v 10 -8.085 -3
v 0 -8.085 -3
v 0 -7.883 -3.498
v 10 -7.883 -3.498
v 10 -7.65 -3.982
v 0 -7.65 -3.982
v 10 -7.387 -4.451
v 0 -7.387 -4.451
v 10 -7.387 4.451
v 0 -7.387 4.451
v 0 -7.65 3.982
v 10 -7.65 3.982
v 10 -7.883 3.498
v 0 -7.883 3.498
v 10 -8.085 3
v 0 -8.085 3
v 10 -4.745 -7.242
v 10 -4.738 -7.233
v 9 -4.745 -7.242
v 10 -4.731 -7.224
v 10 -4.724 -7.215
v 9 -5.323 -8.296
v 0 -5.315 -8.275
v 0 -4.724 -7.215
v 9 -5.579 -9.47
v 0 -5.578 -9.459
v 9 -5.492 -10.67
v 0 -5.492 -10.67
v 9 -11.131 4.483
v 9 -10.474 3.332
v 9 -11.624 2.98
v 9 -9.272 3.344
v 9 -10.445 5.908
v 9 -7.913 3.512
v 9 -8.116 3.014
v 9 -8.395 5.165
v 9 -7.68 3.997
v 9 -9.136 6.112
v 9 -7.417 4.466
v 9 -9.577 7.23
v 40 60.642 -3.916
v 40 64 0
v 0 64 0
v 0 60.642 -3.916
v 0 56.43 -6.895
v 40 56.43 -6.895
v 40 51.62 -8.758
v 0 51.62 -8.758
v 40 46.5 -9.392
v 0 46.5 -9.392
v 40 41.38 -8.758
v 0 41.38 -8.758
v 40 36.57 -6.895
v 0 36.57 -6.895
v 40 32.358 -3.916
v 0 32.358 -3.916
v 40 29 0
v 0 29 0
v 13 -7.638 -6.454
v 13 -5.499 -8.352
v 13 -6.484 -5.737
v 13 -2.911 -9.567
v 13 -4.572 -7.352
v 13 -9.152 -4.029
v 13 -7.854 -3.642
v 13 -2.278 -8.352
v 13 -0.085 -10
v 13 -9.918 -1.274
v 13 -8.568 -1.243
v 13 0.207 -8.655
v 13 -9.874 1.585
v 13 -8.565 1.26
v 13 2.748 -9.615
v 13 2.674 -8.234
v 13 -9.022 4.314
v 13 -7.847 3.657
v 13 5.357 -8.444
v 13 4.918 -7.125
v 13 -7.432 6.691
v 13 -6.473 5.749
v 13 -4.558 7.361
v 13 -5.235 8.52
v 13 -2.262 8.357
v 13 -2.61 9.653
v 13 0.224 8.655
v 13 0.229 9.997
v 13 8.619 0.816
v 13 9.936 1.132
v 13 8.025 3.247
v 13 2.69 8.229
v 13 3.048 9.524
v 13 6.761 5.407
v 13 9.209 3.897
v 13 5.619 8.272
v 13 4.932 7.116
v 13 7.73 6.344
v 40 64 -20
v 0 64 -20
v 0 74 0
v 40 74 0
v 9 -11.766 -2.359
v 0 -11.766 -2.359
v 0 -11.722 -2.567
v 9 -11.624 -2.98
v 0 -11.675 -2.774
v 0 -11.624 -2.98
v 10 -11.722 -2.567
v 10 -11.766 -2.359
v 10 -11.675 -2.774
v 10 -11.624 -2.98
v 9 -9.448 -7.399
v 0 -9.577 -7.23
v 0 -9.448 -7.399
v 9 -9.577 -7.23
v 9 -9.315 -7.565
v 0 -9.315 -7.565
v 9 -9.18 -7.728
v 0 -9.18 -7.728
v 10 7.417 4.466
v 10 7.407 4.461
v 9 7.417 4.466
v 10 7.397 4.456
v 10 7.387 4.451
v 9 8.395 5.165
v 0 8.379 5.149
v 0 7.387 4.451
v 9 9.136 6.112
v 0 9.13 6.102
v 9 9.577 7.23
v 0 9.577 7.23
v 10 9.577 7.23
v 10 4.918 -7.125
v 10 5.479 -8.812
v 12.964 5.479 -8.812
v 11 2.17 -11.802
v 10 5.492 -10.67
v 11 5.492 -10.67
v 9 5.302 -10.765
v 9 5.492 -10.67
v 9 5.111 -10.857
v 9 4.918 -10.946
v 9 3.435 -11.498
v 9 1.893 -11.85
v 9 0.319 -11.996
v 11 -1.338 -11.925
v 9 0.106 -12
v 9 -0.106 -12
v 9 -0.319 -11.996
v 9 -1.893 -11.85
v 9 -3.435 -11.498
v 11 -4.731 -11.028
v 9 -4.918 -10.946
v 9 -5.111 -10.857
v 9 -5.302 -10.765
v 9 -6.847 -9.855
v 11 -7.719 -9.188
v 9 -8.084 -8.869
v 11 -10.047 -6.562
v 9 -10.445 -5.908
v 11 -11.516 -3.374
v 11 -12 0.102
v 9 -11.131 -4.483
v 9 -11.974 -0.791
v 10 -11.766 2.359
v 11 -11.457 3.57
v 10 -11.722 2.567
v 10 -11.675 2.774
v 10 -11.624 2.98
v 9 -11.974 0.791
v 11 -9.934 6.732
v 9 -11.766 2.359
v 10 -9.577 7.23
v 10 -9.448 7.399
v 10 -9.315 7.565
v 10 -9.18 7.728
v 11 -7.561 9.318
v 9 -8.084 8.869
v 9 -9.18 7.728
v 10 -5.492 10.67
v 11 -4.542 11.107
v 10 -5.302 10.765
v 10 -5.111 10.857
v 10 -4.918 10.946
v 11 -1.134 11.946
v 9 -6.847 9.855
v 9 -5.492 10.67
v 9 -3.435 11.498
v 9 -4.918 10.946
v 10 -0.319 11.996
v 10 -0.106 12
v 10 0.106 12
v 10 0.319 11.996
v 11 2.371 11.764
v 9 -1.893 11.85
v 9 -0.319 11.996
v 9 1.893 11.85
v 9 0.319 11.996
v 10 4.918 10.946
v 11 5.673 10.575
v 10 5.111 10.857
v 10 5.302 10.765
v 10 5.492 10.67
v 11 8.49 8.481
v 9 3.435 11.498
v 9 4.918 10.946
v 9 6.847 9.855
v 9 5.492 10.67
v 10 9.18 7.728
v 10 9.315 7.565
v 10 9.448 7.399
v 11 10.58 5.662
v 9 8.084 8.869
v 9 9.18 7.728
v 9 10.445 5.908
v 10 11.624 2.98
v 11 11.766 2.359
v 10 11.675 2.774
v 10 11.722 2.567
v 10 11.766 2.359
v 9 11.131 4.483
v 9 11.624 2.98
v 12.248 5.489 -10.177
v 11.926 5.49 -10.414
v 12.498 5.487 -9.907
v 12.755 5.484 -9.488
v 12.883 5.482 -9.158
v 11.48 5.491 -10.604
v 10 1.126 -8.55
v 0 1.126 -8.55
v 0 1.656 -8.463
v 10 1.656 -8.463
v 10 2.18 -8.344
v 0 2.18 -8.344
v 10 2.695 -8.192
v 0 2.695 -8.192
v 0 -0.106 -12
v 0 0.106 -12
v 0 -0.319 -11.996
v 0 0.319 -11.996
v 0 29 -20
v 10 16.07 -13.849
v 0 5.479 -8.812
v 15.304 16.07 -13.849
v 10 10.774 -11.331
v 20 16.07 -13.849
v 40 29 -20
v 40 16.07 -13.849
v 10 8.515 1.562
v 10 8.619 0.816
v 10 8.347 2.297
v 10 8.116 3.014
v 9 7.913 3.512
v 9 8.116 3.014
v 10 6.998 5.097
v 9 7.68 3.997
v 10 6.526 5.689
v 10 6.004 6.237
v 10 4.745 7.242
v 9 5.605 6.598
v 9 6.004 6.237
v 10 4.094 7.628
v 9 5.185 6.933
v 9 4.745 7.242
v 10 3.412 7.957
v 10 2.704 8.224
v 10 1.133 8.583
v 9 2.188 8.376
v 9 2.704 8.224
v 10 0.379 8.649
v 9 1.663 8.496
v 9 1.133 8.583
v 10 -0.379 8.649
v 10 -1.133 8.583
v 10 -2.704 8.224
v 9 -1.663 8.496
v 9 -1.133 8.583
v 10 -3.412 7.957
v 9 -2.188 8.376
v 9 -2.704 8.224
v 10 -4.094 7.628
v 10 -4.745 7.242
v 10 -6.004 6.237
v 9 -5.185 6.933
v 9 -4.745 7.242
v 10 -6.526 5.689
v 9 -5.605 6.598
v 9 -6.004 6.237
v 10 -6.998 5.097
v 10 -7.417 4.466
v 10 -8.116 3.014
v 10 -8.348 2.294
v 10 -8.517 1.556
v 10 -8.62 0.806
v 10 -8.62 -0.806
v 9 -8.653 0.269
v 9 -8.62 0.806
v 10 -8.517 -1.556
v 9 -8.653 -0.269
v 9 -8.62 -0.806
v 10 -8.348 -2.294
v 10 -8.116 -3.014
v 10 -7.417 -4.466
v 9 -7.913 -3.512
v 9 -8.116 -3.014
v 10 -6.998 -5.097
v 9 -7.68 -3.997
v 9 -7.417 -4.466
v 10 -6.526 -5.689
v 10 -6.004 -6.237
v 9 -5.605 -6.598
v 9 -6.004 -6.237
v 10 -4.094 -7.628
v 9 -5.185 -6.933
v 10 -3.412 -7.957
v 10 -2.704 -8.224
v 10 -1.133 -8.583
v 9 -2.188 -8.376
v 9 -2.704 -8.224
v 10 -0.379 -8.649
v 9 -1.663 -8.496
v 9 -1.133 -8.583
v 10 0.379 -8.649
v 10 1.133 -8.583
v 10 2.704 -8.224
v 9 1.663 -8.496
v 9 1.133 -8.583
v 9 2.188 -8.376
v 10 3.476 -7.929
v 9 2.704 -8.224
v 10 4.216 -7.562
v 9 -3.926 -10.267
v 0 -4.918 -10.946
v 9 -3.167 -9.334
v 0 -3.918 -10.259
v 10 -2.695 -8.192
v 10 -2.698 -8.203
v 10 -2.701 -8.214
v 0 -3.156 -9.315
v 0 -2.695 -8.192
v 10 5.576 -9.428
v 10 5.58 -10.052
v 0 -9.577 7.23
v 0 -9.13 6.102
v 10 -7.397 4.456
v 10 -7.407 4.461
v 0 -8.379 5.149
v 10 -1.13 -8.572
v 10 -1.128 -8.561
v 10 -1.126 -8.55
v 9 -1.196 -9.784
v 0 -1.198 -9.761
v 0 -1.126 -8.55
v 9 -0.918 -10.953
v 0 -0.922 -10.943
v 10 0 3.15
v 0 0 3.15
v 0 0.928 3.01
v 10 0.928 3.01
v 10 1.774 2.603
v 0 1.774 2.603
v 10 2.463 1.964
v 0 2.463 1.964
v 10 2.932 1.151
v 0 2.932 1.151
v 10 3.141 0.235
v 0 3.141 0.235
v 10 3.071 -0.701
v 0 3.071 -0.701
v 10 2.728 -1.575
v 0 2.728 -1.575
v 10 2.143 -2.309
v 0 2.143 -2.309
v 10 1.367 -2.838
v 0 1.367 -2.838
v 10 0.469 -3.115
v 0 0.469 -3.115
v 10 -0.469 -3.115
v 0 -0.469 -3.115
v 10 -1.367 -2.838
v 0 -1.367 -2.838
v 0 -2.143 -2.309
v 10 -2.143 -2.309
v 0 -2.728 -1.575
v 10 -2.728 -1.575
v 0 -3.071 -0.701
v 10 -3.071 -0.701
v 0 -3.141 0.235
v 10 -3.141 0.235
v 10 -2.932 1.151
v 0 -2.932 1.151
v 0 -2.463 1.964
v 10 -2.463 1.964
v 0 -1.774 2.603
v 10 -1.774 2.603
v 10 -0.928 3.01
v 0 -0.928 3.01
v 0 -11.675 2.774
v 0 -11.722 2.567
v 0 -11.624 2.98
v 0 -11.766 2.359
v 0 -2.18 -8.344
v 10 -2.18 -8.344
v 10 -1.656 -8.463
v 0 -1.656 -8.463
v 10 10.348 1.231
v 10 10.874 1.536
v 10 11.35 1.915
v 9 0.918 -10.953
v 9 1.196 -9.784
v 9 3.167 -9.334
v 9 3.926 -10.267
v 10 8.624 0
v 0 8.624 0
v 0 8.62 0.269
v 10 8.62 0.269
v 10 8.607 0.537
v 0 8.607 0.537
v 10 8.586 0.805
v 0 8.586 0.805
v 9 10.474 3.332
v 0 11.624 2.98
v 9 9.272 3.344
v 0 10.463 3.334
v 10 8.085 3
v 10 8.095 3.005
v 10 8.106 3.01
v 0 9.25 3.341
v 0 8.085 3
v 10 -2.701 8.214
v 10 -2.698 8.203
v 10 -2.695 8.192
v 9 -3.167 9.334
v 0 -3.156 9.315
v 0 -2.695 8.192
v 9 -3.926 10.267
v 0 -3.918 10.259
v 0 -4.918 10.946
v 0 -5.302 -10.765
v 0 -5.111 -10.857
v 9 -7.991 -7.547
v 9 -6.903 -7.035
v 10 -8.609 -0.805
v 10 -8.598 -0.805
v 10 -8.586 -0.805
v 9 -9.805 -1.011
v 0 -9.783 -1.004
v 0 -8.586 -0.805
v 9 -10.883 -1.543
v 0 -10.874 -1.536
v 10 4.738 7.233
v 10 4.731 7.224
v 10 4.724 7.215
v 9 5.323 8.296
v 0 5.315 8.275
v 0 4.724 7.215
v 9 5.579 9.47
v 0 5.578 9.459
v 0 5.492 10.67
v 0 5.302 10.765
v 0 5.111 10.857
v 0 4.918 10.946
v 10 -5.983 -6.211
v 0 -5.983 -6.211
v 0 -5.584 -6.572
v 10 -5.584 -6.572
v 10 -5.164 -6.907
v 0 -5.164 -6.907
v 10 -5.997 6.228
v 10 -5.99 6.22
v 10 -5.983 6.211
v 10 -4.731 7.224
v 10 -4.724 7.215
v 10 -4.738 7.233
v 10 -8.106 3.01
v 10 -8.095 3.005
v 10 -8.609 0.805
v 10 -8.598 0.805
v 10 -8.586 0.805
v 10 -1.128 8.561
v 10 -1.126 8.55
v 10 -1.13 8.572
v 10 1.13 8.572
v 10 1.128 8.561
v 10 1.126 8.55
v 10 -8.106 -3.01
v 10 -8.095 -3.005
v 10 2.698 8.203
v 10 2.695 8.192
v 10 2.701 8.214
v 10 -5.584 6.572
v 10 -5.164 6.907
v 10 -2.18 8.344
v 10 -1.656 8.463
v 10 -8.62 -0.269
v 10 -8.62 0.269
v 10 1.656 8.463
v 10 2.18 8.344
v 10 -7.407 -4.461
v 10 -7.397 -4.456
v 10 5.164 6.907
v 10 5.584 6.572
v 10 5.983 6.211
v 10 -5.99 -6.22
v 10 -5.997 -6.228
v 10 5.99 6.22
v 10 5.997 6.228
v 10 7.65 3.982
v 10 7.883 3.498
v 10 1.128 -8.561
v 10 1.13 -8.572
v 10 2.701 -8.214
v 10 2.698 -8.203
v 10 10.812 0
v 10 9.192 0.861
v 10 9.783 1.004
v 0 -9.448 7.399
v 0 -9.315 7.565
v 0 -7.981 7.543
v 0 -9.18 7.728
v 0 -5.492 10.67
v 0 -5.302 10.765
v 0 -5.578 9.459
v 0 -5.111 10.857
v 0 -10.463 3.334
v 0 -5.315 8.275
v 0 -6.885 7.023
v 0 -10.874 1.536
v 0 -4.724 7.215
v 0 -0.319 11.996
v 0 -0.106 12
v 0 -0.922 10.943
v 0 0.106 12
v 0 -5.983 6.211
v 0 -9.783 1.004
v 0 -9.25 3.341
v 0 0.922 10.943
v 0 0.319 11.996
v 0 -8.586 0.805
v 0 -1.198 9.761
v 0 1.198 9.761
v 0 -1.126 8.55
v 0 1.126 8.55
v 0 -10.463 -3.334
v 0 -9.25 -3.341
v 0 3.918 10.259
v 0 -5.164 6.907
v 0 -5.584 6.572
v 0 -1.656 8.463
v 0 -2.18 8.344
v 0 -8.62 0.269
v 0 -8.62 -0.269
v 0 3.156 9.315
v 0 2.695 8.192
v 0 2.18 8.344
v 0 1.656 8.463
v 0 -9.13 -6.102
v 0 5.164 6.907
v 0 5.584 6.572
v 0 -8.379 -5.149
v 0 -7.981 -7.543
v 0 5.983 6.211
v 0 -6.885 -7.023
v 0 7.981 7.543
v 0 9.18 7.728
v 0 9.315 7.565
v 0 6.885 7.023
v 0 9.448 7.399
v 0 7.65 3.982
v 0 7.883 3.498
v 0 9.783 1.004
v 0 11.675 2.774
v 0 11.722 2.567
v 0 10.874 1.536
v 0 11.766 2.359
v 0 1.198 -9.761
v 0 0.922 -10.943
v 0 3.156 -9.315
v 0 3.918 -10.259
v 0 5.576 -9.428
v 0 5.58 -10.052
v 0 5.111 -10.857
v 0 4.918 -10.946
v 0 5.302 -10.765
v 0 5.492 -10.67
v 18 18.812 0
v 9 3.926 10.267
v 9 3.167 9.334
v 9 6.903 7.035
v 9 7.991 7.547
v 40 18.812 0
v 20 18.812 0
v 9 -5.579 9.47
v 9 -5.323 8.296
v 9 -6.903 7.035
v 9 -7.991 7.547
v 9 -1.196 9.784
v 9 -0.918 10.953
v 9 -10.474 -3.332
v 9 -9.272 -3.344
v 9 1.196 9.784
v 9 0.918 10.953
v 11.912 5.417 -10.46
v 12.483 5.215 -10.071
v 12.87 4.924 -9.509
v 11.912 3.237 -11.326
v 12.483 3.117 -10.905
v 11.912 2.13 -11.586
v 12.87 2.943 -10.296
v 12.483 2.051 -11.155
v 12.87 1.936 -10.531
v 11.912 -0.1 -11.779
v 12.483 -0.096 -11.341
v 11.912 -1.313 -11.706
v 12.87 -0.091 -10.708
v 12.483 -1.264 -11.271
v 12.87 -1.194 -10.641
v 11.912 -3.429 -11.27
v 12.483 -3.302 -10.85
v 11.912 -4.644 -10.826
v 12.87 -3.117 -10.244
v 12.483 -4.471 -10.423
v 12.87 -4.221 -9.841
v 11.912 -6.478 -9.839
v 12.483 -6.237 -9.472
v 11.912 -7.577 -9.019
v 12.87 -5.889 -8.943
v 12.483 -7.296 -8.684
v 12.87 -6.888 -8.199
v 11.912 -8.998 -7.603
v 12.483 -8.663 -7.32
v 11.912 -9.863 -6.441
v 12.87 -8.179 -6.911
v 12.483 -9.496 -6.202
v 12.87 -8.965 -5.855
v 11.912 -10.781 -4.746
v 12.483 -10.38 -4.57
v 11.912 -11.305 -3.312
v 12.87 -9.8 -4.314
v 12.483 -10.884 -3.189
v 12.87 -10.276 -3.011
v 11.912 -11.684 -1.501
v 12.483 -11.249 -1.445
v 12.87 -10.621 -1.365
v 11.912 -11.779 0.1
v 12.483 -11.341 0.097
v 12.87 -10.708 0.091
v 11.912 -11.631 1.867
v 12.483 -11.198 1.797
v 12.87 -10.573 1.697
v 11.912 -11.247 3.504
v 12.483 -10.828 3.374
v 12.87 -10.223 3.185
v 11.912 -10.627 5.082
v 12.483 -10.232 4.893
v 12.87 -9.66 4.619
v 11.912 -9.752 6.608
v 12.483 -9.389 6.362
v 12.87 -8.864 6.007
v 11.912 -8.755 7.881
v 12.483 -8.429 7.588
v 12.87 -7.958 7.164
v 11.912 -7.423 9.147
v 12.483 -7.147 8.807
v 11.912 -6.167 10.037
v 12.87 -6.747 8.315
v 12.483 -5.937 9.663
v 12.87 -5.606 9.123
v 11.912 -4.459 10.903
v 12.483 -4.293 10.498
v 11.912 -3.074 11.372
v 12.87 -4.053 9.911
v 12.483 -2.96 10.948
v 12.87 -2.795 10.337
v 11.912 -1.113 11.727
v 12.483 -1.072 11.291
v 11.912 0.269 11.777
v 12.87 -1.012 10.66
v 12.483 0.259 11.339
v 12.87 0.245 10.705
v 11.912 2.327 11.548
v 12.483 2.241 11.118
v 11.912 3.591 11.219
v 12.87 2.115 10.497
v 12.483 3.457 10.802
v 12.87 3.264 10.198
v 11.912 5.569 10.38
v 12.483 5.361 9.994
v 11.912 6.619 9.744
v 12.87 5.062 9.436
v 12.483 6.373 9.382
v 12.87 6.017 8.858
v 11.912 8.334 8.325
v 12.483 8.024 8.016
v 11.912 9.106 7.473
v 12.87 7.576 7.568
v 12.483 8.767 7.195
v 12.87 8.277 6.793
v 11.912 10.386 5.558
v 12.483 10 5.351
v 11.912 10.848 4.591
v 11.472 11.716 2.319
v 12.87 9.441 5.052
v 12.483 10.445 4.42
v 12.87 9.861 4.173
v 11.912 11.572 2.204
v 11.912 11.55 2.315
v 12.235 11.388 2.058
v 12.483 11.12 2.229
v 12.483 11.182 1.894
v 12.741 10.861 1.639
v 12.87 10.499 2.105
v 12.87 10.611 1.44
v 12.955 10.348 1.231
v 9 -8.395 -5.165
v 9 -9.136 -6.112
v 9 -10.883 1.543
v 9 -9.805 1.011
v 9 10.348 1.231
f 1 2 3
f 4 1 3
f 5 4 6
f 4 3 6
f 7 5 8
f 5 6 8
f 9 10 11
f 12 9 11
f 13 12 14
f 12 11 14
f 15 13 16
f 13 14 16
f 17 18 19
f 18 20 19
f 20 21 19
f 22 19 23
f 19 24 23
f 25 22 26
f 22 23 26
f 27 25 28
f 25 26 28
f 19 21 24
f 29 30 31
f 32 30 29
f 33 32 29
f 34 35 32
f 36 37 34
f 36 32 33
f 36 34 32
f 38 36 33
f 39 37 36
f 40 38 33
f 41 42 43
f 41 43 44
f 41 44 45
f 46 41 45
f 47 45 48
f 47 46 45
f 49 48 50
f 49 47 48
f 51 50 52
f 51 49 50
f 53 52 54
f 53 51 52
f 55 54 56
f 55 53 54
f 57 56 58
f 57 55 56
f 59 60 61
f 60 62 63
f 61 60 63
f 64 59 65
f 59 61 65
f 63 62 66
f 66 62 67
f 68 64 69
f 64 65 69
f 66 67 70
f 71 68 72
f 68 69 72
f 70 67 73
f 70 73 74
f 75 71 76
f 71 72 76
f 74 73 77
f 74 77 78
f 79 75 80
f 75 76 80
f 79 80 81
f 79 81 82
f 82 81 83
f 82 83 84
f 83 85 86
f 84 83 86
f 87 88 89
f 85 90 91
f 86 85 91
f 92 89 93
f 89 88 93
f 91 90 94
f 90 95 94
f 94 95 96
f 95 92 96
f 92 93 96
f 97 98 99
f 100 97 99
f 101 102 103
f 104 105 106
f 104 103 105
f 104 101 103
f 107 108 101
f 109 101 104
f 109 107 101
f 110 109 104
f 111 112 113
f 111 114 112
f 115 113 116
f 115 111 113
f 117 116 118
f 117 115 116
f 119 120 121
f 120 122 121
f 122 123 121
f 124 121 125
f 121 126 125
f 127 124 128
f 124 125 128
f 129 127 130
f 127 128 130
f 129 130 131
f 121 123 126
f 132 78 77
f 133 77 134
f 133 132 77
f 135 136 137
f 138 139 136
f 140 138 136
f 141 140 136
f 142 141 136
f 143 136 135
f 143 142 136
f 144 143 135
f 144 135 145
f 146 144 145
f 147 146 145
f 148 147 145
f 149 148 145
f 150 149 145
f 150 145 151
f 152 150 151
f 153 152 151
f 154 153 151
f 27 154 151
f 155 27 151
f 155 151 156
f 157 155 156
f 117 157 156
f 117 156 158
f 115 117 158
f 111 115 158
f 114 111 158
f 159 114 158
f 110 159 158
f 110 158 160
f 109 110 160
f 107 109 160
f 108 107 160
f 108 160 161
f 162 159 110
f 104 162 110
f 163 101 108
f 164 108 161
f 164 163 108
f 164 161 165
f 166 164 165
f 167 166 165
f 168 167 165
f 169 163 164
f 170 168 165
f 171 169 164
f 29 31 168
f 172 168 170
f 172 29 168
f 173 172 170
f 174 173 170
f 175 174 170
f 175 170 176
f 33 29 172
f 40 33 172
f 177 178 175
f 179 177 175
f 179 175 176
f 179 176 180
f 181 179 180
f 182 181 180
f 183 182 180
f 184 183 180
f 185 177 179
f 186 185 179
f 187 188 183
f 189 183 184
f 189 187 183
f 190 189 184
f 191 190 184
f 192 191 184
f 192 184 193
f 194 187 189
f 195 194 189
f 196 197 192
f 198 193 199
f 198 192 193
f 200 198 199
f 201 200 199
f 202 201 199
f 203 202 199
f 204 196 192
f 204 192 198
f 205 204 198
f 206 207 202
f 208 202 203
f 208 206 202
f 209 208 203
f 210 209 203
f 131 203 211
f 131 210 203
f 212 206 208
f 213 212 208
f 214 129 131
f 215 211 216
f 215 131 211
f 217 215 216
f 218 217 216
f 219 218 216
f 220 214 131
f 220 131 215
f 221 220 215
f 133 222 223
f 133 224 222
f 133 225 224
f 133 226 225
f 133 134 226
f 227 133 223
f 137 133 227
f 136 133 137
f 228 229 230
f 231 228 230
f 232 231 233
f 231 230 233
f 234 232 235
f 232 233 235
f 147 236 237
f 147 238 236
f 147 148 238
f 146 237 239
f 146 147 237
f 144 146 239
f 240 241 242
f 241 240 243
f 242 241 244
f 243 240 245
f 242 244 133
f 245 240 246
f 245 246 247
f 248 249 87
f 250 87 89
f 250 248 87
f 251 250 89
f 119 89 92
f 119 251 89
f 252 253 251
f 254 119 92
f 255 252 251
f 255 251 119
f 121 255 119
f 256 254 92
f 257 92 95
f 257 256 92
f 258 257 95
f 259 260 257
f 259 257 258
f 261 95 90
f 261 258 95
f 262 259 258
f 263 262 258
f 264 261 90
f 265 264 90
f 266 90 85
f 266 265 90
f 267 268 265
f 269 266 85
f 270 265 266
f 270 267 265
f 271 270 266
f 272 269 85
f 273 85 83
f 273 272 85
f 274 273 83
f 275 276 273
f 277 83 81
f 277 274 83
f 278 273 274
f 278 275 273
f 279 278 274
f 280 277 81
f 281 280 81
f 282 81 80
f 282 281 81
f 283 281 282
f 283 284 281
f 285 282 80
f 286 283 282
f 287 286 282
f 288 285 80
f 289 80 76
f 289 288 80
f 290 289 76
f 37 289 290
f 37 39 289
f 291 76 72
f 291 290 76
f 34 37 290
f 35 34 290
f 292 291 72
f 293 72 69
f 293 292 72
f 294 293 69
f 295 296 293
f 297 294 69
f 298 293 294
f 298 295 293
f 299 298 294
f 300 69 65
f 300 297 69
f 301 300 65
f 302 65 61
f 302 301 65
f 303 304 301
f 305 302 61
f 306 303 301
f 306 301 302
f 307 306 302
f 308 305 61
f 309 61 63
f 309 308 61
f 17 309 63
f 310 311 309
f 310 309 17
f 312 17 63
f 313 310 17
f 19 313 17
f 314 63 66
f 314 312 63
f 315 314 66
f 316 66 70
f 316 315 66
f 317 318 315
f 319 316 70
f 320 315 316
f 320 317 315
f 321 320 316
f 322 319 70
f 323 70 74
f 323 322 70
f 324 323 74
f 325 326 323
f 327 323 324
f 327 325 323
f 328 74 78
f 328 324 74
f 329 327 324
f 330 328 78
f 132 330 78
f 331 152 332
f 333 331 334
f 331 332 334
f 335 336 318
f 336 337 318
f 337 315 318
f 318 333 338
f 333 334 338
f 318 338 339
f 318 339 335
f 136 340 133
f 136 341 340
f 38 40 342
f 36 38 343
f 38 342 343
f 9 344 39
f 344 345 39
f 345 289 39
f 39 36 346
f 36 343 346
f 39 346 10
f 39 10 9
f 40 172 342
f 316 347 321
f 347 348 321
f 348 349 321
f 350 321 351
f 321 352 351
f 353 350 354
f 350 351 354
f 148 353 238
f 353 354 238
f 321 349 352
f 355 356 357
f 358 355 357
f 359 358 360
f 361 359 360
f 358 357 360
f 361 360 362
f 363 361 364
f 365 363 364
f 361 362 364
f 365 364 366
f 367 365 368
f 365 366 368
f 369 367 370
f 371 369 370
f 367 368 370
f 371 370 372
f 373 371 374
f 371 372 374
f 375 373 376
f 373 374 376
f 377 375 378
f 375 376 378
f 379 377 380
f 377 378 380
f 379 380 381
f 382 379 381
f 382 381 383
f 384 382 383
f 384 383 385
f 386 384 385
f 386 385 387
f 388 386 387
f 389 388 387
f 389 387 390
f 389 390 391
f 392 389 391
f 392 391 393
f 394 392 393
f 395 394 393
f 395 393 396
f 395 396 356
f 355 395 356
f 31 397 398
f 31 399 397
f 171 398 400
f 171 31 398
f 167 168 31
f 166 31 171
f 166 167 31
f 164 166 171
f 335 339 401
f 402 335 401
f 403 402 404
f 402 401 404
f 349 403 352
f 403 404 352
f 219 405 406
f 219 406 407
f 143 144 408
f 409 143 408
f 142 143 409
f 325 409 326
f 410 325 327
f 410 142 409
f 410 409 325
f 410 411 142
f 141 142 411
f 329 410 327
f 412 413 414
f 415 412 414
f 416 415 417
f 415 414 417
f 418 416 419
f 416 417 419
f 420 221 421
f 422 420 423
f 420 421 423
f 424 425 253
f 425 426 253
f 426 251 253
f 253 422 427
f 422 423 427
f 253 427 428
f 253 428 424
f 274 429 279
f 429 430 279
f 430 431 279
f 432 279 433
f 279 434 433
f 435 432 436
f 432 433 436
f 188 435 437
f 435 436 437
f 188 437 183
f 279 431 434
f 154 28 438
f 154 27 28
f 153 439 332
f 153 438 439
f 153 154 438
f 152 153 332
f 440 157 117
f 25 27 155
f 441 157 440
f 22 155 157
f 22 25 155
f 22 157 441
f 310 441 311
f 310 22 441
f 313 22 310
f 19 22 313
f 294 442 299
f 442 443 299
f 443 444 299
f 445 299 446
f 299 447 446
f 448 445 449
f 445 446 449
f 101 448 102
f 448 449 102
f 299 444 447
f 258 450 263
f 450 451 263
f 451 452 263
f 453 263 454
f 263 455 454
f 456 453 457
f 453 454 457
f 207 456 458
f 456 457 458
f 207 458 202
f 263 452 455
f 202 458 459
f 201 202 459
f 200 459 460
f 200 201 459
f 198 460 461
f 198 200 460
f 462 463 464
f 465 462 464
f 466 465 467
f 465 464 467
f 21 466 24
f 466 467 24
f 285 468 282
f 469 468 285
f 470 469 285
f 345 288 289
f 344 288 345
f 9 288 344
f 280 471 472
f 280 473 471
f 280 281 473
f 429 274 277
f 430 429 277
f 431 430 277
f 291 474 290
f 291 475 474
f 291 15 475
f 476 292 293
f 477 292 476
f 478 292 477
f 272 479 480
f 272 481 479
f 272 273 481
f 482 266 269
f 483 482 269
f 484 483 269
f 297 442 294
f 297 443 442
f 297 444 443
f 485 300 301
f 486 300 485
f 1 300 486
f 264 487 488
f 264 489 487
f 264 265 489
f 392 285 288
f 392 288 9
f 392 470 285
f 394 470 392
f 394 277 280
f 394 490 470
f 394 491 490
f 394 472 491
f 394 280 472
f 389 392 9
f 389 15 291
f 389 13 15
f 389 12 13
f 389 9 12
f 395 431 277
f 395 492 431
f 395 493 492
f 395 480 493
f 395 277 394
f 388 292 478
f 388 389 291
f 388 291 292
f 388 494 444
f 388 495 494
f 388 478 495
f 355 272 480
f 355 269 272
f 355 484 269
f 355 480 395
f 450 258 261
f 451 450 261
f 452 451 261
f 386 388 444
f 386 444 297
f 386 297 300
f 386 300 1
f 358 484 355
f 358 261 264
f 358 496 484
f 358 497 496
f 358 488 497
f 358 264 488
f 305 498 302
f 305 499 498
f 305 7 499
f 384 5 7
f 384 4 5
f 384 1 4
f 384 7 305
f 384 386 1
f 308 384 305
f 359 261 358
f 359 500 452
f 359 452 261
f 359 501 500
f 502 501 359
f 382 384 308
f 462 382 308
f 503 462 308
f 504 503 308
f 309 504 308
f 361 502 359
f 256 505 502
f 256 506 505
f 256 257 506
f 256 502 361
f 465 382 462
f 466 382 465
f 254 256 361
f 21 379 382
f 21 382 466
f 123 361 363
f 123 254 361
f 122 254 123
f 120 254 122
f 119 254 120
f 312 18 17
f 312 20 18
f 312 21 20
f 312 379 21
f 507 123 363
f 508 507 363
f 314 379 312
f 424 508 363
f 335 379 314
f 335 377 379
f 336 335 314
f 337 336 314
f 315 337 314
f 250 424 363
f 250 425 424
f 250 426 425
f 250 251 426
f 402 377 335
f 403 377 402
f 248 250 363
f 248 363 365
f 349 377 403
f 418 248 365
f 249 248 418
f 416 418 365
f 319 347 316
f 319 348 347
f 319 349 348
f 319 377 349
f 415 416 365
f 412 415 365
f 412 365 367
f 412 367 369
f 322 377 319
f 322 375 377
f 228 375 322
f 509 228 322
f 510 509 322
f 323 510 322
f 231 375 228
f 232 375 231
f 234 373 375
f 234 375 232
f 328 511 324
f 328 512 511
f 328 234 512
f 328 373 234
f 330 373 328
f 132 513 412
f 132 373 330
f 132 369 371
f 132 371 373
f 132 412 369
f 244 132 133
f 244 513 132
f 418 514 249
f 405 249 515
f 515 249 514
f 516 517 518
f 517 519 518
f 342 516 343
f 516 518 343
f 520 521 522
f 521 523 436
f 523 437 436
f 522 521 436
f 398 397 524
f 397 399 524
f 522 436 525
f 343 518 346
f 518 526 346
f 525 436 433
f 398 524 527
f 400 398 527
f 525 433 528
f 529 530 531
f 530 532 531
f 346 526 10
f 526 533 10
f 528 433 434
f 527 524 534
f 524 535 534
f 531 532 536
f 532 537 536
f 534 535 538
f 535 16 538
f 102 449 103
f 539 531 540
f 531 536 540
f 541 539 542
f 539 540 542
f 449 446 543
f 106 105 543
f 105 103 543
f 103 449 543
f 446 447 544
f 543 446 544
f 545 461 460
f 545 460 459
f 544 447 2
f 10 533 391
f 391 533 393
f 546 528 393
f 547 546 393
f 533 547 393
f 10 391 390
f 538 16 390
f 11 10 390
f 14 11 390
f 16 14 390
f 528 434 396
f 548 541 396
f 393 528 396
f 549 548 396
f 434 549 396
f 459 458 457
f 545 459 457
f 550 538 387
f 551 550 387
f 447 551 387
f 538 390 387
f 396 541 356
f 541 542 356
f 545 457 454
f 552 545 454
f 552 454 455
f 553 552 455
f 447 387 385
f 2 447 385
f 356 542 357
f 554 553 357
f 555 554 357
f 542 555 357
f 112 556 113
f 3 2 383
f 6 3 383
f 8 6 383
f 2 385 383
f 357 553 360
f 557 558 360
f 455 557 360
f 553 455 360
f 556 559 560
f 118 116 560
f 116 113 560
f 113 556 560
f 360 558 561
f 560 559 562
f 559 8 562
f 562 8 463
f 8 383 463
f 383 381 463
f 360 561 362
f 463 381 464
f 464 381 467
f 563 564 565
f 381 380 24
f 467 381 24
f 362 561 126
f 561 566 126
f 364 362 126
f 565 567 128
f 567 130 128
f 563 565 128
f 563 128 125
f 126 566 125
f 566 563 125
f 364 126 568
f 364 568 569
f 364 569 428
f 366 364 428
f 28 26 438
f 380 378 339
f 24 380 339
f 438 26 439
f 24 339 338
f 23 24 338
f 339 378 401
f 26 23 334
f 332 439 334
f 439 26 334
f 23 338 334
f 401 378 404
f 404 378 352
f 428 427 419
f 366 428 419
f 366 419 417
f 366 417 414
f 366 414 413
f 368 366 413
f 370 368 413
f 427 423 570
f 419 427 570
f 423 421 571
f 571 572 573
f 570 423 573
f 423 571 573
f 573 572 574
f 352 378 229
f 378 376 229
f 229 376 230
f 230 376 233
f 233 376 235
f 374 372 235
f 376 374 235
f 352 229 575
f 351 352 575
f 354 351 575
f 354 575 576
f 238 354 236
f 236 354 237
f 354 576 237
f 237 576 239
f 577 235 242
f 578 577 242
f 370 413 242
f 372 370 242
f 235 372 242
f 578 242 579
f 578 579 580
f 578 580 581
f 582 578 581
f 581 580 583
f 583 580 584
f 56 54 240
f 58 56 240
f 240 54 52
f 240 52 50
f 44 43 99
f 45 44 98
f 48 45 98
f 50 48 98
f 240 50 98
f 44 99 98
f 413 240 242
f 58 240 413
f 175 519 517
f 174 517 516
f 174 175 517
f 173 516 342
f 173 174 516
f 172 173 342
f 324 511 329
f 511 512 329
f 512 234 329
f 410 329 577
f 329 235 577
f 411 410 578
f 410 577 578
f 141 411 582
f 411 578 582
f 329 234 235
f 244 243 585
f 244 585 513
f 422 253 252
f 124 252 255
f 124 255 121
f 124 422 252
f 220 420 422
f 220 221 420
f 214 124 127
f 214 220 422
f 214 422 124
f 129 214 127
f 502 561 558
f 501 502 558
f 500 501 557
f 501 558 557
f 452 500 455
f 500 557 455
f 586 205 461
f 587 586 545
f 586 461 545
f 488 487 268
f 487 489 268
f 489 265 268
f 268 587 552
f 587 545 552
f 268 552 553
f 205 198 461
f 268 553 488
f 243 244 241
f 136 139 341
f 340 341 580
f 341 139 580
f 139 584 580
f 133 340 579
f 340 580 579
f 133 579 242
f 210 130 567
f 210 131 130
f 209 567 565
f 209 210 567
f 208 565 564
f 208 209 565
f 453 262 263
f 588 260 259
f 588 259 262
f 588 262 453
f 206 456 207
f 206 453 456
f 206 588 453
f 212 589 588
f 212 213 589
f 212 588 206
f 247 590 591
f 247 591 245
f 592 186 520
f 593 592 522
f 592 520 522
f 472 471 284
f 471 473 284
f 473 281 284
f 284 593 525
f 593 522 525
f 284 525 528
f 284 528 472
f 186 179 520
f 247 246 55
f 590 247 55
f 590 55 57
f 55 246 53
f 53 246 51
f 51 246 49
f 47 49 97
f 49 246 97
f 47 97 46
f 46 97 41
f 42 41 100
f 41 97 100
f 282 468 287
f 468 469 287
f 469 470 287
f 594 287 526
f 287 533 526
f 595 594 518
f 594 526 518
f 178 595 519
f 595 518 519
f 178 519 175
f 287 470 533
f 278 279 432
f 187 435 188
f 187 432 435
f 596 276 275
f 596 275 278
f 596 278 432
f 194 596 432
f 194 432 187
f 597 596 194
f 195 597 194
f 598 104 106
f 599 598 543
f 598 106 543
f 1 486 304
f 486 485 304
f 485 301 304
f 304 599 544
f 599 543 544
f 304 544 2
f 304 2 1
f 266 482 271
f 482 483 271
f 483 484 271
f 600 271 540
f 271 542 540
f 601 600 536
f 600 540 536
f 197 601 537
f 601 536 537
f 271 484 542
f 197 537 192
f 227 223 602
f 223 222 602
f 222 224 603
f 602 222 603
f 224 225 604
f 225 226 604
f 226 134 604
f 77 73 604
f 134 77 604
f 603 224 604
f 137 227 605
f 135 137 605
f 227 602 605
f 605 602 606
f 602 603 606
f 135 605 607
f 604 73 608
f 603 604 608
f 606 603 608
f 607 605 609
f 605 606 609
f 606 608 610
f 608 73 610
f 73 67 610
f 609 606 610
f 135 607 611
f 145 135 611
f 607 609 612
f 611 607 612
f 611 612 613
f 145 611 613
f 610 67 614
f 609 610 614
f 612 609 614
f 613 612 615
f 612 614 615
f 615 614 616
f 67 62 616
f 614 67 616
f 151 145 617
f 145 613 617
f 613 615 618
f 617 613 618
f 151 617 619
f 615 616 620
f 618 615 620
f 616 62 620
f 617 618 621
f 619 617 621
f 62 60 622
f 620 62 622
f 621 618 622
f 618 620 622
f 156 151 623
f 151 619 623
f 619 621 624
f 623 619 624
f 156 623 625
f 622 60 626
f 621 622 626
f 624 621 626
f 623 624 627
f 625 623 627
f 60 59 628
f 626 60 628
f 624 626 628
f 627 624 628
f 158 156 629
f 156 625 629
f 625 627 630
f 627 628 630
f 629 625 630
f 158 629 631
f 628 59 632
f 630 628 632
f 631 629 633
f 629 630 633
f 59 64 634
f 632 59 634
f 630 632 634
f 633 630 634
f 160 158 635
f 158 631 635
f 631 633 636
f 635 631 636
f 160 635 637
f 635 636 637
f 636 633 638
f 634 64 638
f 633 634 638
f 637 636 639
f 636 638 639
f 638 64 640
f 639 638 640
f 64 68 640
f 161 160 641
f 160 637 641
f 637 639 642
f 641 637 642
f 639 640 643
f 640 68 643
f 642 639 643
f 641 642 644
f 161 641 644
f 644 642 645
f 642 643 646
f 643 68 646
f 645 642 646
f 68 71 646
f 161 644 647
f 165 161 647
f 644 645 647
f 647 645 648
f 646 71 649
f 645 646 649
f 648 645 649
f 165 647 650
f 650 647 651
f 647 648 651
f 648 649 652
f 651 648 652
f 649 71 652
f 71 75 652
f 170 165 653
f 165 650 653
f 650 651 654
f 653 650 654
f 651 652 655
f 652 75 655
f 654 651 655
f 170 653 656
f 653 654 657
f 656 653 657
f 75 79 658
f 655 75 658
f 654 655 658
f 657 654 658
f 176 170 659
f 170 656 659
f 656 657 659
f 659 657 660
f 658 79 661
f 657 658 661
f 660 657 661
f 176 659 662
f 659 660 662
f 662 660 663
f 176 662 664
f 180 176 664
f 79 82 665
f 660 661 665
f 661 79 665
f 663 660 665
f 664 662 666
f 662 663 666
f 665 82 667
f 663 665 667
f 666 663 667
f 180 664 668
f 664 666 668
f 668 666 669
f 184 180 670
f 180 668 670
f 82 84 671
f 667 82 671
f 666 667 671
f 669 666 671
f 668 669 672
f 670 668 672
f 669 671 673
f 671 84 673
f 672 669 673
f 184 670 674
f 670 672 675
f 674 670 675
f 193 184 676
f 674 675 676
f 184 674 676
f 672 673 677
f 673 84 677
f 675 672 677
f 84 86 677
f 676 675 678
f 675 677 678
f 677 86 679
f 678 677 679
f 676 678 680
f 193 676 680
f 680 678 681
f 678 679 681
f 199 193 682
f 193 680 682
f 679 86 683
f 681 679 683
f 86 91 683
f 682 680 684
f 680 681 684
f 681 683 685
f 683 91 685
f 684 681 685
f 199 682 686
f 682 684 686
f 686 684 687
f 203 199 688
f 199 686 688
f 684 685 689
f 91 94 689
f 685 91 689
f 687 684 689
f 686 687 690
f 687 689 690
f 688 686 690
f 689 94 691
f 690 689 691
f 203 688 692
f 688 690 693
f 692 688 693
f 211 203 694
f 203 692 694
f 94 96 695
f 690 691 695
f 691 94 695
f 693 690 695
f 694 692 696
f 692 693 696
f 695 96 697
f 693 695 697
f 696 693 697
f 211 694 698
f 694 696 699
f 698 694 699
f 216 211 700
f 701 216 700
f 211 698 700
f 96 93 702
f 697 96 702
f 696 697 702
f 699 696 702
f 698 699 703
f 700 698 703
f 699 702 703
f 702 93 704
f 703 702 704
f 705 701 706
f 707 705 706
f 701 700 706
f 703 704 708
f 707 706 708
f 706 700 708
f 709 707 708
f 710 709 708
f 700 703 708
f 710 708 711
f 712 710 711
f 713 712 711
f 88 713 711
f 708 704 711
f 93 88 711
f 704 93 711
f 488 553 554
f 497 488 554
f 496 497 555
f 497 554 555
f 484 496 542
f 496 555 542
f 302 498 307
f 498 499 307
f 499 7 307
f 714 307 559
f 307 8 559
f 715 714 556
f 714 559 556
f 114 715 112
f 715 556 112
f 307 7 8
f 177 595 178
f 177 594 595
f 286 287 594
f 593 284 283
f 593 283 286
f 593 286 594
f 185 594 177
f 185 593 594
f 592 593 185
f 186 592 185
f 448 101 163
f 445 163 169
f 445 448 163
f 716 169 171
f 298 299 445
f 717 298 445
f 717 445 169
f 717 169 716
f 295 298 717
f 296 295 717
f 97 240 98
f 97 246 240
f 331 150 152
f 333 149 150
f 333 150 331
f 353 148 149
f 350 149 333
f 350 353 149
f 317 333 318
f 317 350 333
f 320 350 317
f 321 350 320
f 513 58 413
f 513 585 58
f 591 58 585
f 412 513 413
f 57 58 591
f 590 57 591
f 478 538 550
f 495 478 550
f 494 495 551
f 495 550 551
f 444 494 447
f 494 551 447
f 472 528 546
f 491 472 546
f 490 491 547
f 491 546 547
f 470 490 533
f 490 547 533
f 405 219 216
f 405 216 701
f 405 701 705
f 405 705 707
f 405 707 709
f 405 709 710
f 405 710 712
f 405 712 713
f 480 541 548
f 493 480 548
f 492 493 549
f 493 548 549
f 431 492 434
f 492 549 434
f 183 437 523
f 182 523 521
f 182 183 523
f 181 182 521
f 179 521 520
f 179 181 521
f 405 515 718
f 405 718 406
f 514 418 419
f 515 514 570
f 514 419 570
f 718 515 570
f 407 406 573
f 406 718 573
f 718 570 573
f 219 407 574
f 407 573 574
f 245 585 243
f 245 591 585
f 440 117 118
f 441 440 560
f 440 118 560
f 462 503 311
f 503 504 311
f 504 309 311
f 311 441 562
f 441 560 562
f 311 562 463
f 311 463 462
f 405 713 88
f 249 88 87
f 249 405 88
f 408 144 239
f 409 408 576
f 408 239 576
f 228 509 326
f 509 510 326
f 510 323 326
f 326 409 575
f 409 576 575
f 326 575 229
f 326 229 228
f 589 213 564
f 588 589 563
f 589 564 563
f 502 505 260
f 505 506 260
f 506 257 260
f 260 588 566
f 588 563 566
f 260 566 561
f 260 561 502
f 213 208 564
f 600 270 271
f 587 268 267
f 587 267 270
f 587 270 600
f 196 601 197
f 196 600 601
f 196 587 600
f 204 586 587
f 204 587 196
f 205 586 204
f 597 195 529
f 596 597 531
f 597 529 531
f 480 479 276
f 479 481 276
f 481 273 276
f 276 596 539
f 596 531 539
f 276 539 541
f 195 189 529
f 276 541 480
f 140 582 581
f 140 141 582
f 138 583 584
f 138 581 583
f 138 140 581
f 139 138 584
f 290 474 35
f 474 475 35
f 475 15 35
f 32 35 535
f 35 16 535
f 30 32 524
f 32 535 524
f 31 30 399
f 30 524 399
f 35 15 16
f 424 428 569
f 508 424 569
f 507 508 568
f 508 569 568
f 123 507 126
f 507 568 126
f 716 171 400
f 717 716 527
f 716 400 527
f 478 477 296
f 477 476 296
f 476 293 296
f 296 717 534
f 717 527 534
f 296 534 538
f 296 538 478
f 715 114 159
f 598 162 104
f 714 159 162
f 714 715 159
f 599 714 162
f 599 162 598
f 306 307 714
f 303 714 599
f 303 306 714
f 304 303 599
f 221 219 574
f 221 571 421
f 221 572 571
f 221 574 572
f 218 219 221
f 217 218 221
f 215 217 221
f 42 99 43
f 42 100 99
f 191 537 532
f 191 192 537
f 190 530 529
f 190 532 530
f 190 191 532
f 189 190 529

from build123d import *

# Parameters (mm, degrees)
BASPROSKE_W              = 10
BASPROSKE_H              = 12
TOOTHCUT_DEPTH           = 20.697716
TEETHCUTS_COUNT          = 14
TEETHCUTS_ANGLE          = 334.285714
BORSKE_R                 = 1.5
BORE_DEPTH               = 50.000051
BOSS_EXTRUDE1_DEPTH      = 10
BOSS_EXTRUDE2_START      = -40
BOSS_EXTRUDE2_DEPTH      = 40
CUT_EXTRUDE5_DEPTH       = 30
BOSS_EXTRUDE5_DEPTH      = 10
CHAMFER1_SIZE            = 10
BOSS_EXTRUDE6_DEPTH      = 3
BOSS_EXTRUDE6_DEPTH_BACK = 1
FILLET1_R                = 2
SKETCH12_R               = 3.15
CUT_EXTRUDE6_DEPTH       = 87.463865


with BuildPart() as part:
    # BasProSke → Base-Revolve (revolve)
    with BuildSketch(Plane(origin=(0, 0, 0), x_dir=(1, 0, 0), z_dir=(0, 1, 0)), mode=Mode.PRIVATE) as base_revolve_sk:
        with Locations((5, 6)):
            Rectangle(BASPROSKE_W, BASPROSKE_H)
    revolve(base_revolve_sk.sketch.rotate(Axis((-10, 0, 0), (1, 0, 0)), 180), axis=Axis((-10, 0, 0), (1, 0, 0)))

    # TooCutSke → ToothCut (cut, through all)
    with BuildSketch(Plane(origin=(0, 0, 0), x_dir=(0, 0, -1), z_dir=(1, 0, 0))):
        with BuildLine():
            ThreePointArc((0.804846, 8.586361), (0, 8.624), (-0.804846, 8.586361))
            ThreePointArc((-0.804846, 8.586361), (-1.237812, 10.362618), (-2.384428, 11.786634))
            ThreePointArc((-2.384428, 11.786634), (0, 12.0254), (2.384428, 11.786634))
            ThreePointArc((2.384428, 11.786634), (1.237812, 10.362618), (0.804846, 8.586361))
        make_face()
    toothcut = extrude(amount=TOOTHCUT_DEPTH, mode=Mode.SUBTRACT)

    # TeethCuts: ToothCut ×14 about axis
    teethcuts_axis = Axis((-10, 0, 0), (1, 0, 0))
    for i in range(1, TEETHCUTS_COUNT):
        add(toothcut.rotate(teethcuts_axis, i * TEETHCUTS_ANGLE / (TEETHCUTS_COUNT - 1)), mode=Mode.SUBTRACT)

    # BorSke → Bore (cut, symmetric)
    with BuildSketch(Plane(origin=(0, 0, 0), x_dir=(0, 0, -1), z_dir=(1, 0, 0))):
        with Locations(Location((0, 0, 0), (0, 0, 180))):
            Circle(BORSKE_R)
    extrude(amount=BORE_DEPTH, both=True, mode=Mode.SUBTRACT)

    # Sketch1 → Boss-Extrude1 (add)
    with BuildSketch(Plane(origin=(10, 0, 0), x_dir=(0, 0, -1), z_dir=(1, 0, 0))):
        with BuildLine():
            Line((0, 29), (0, 4))
            Line((0, 4), (8, 4))
            Line((8, 4), (20, 29))
            Line((20, 29), (20, 64))
            Line((20, 64), (0, 74))
            Line((0, 74), (0, 64))
            ThreePointArc((0, 64), (9.391813, 46.5), (0, 29))
        make_face()
    extrude(amount=-BOSS_EXTRUDE1_DEPTH)

    # Sketch2 → Boss-Extrude2 (add)
    with BuildSketch(Plane.ZY.offset(BOSS_EXTRUDE2_START)):
        with BuildLine():
            Line((-20, 29), (-7.698792, 3.139406))
            Line((-7.698792, 3.139406), (0, 8.624))
            Line((0, 8.624), (0, 29))
            ThreePointArc((0, 29), (-9.391813, 46.5), (0, 64))
            Line((0, 64), (0, 74))
            Line((0, 74), (-20, 64))
            Line((-20, 64), (-20, 29))
        make_face()
    extrude(amount=BOSS_EXTRUDE2_DEPTH)

    # Sketch9 → Cut-Extrude5 (cut)
    with BuildSketch(Plane(origin=(40, 0, 0), x_dir=(0, 0, -1), z_dir=(1, 0, 0))):
        Polygon((7.698792, 3.139406), (0, 8.624), (0, 18.812), (13.849396, 16.069703), align=None)
    extrude(amount=-CUT_EXTRUDE5_DEPTH, mode=Mode.SUBTRACT)

    # Sketch10 → Boss-Extrude5 (add)
    with BuildSketch(Plane(origin=(10, 0, 0), x_dir=(0, 0, -1), z_dir=(1, 0, 0))):
        Polygon((0, 18.812), (0, 10.812), (11.330599, 10.774484), (15.153835, 18.812), align=None)
    extrude(amount=BOSS_EXTRUDE5_DEPTH)

    # Chamfer1
    # the kernel refuses this chamfer: 10 mm, written as the material it takes off along each edge
    with BuildSketch(Plane(origin=(20, 10.897149, 25.716689), x_dir=(0.027495876610586313, 0.9996164375424699, -0.003309768015556128), z_dir=(0, -0.0033110198561701067, -0.999994518558733))) as chamfer1_piece_1_section:
        Polygon((CHAMFER1_SIZE * 0.999621916911, -CHAMFER1_SIZE * 0.0274958766106), (-CHAMFER1_SIZE * 0.0274958766106, -CHAMFER1_SIZE * 0.999621916911), (0, 0), align=None)
    chamfer1_piece_1 = extrude(amount=62.764321, mode=Mode.PRIVATE)
    chamfer1_piece_1 = split(chamfer1_piece_1, bisect_by=Plane(origin=(16.383831, 18.515288, -1.498481), z_dir=(0, -0.980954576947178, 0.19423727234077168)), keep=Keep.TOP, mode=Mode.PRIVATE)
    chamfer1_piece_1 = split(chamfer1_piece_1, bisect_by=Plane(origin=(10, 13.486301, -0.502699), z_dir=(1, 0, 0)), keep=Keep.TOP, mode=Mode.PRIVATE)
    add(chamfer1_piece_1, mode=Mode.SUBTRACT)

    # Sketch11 → Boss-Extrude6 (add, two sides: drawn at the far end of the back side and taken through both)
    with BuildSketch(Plane(origin=(10, 0, 0), x_dir=(0, 0, -1), z_dir=(1, 0, 0)).offset(-BOSS_EXTRUDE6_DEPTH_BACK)):
        with BuildLine():
            Line((-2.358667, 11.765912), (-1.230525, 10.347781))
            Line((-1.230525, 10.347781), (-0.81596, 8.618917))
            ThreePointArc((-0.81596, 8.618917), (-3.657356, -7.846992), (7.125155, 4.917692))
            Line((7.125155, 4.917692), (8.811802, 5.479265))
            Line((8.811802, 5.479265), (10.669566, 5.491846))
            ThreePointArc((10.669566, 5.491846), (-5.206605, -10.811626), (-2.358667, 11.765912))
        make_face()
    extrude(amount=BOSS_EXTRUDE6_DEPTH + BOSS_EXTRUDE6_DEPTH_BACK)

    # Fillet1
    fillet1_edges = [part.edges().sort_by_distance(p)[0] for p in [
        (13, -10.811626, 5.206605),
    ]]
    fillet(fillet1_edges, radius=FILLET1_R)

    # Sketch12 → Cut-Extrude6 (cut, through all)
    with BuildSketch(Plane.ZY):
        Circle(SKETCH12_R)
    extrude(amount=-CUT_EXTRUDE6_DEPTH, mode=Mode.SUBTRACT)


solid = part.part
